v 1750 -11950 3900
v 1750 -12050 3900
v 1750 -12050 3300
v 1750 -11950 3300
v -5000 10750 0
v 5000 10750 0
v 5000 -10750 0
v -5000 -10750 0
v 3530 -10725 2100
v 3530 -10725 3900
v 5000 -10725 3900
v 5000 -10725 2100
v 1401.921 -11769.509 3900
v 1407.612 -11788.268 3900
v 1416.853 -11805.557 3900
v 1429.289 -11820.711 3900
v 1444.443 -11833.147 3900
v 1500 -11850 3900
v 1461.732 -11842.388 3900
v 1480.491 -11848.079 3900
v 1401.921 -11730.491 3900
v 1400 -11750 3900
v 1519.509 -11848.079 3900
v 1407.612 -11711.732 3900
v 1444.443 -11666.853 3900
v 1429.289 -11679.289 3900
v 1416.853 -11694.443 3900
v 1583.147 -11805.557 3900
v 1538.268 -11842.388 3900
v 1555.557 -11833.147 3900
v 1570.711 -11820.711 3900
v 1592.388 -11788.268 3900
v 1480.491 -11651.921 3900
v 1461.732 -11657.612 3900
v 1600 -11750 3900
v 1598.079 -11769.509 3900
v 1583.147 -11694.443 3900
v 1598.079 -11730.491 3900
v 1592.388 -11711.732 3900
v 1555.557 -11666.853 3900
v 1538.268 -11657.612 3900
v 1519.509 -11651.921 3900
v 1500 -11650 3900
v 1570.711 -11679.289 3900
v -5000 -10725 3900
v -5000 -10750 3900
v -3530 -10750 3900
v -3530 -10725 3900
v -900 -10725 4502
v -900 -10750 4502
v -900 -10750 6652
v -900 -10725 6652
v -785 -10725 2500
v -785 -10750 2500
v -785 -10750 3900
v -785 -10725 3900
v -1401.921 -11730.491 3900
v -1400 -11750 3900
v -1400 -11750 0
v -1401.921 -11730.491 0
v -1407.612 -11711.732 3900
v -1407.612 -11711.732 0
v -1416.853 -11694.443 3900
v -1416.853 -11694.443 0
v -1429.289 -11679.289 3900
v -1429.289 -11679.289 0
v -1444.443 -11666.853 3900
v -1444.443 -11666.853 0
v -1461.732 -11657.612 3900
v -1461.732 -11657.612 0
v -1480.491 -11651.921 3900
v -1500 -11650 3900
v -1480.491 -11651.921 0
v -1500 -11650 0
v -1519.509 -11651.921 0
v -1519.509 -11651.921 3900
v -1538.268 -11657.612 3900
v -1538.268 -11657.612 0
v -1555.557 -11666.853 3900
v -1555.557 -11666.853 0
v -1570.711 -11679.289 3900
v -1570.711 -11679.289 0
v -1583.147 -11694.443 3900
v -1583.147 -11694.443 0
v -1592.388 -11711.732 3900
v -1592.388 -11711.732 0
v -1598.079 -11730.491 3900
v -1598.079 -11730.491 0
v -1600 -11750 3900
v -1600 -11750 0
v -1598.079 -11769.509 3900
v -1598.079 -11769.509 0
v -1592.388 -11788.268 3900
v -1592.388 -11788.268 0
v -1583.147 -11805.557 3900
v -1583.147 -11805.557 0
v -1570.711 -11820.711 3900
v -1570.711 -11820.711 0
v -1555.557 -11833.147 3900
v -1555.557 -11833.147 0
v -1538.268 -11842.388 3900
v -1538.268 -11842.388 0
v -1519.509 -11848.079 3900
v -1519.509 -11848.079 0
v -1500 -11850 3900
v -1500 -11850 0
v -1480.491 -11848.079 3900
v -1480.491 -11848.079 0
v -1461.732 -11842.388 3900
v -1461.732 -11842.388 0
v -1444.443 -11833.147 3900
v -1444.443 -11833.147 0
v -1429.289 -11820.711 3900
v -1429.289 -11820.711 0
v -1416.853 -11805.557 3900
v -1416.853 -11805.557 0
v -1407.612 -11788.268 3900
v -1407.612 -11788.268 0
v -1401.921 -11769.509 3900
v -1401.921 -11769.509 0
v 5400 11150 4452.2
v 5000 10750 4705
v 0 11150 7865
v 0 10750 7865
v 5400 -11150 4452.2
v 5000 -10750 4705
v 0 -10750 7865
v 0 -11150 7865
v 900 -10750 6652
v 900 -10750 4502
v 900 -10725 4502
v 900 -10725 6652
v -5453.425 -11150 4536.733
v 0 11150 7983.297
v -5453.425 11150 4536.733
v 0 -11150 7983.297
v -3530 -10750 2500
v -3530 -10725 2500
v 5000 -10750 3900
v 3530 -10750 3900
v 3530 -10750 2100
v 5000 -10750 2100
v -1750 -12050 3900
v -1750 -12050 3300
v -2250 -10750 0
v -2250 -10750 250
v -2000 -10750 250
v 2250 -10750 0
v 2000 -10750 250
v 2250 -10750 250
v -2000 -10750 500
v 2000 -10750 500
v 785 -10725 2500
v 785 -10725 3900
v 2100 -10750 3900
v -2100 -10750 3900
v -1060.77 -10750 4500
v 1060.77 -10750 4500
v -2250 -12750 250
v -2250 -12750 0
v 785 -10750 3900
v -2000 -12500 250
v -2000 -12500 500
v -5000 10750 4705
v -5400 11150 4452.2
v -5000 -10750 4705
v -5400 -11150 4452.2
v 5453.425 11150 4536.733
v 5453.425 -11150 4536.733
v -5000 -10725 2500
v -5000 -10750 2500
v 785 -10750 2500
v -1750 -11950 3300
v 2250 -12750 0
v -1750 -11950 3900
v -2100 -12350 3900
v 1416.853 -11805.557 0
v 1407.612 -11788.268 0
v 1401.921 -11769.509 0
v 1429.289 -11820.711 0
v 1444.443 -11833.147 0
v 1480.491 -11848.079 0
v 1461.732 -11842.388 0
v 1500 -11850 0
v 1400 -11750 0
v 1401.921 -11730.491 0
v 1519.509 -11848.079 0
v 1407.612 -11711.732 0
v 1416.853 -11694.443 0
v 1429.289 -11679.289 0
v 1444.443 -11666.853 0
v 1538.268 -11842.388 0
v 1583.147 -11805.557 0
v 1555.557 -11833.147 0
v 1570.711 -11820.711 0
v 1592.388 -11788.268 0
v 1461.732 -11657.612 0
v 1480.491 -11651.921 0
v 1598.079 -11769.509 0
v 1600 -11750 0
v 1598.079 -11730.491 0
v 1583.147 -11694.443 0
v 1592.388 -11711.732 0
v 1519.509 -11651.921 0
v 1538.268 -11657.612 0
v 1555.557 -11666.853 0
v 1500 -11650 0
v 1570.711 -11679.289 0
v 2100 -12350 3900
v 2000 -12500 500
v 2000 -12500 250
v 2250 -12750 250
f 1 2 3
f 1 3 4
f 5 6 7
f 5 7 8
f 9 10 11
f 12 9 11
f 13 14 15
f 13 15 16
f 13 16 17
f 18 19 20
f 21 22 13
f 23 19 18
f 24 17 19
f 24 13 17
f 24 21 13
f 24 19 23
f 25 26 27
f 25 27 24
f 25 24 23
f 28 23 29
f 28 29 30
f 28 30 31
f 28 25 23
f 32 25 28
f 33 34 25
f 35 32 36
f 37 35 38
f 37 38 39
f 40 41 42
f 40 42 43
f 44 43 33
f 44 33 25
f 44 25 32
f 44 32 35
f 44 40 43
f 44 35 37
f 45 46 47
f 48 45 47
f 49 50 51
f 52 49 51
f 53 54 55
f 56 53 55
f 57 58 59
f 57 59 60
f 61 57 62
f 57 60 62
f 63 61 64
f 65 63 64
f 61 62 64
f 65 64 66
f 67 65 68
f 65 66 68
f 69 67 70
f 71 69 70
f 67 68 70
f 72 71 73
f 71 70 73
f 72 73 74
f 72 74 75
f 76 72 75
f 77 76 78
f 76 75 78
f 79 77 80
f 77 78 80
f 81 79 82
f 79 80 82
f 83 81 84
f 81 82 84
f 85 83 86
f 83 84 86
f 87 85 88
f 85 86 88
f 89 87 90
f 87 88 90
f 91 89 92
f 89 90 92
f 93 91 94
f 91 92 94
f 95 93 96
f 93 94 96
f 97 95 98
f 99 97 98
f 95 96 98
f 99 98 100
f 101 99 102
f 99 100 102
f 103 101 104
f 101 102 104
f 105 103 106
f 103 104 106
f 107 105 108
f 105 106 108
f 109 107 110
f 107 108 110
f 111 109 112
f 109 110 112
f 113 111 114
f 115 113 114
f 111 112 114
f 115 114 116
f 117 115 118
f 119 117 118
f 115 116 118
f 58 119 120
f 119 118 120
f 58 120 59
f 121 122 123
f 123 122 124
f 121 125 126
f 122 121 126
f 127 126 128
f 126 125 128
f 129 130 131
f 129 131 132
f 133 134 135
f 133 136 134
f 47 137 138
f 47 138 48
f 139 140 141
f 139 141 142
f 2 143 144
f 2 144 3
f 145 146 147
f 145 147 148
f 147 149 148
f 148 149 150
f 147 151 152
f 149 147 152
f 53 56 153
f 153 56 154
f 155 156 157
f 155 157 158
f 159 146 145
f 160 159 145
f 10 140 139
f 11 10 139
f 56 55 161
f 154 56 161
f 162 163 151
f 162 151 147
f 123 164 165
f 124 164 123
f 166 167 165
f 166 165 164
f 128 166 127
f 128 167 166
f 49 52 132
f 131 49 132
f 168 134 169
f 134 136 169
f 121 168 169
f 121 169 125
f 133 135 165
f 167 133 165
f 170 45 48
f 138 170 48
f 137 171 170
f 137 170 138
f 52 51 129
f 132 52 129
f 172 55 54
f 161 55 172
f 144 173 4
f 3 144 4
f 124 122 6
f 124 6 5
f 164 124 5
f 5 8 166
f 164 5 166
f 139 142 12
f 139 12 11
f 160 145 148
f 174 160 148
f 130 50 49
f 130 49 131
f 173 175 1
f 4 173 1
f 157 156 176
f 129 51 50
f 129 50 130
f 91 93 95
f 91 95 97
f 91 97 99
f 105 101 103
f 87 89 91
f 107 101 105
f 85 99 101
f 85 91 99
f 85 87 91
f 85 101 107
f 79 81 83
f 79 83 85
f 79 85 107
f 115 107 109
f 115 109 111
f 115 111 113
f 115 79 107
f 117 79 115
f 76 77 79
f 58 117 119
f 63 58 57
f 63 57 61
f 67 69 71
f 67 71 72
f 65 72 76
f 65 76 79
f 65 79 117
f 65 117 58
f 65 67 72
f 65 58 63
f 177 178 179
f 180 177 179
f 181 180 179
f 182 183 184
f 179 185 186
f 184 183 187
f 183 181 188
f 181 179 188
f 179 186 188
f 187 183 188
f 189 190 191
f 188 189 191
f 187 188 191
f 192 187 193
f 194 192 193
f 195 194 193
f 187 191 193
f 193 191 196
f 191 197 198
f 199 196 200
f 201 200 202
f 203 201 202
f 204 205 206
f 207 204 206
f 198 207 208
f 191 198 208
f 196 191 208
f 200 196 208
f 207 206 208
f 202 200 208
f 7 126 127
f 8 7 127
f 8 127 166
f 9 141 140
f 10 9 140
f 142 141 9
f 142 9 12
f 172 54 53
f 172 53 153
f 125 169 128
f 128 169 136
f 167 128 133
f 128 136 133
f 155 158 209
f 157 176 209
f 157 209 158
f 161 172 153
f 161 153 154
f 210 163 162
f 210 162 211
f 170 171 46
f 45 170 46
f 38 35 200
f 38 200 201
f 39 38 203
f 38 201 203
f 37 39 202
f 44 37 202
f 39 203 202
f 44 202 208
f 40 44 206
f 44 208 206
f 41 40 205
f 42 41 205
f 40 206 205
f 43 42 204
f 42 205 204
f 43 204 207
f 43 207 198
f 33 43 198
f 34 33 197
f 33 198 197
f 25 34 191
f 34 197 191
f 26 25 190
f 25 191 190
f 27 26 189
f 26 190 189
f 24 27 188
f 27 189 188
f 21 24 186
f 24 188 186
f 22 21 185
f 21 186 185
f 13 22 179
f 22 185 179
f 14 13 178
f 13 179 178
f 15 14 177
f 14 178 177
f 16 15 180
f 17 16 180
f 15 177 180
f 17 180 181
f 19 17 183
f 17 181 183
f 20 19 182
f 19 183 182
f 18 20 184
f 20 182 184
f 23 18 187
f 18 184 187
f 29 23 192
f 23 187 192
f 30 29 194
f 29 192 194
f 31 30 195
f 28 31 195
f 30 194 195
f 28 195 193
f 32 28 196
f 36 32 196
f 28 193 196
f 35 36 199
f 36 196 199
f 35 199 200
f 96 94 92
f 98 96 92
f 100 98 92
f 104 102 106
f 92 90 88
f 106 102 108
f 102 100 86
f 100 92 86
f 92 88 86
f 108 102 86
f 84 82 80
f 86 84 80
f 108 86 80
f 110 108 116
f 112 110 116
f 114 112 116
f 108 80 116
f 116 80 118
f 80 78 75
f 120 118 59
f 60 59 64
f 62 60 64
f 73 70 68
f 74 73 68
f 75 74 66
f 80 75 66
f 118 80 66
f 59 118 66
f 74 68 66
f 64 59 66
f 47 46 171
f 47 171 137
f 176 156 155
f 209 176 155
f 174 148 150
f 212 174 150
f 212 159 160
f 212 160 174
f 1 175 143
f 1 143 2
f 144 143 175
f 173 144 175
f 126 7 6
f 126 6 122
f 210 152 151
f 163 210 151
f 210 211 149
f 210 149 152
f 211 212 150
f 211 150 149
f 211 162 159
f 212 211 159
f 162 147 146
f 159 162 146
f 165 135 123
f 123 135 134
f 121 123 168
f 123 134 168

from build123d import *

# Parameters (mm, degrees)
F1_DEPTH  = 10750
F3_DEPTH  = 21500
F5_DEPTH  = 400
F7_DEPTH  = 400
F9_W      = 1800
F9_H      = 2150
F10_DEPTH = 25
F9_W_2    = 1570
F9_H_2    = 1400
F9_W_3    = 1470
F9_H_3    = 1800
F11_R     = 100
F12_DEPTH = 3900
F13_W     = 4200
F13_H     = 1600
F13_R     = 100
F14_DEPTH = 600
F16_DEPTH = 7553.4257402618
F19_DEPTH = 23900.001
F21_DEPTH = 2000
F22_W     = 4000
F22_H     = 250
F23_DEPTH = 250
F24_W     = 3500
F24_H     = 100
F25_DEPTH = 600


with BuildPart() as f1:
    # F0 (on Front) → F1 (new body, symmetric)
    with BuildSketch(Plane.XZ):
        Polygon((0, 7865), (0, 0), (5000, 0), (5000, 4705), align=None)
    extrude(amount=F1_DEPTH, both=True)

    # F2 (on face) → F3 (join)
    with BuildSketch(Plane.XZ.offset(10750)):
        Polygon((5400, 4452.2), (5453.4247402618, 4536.7328168699), (0, 7983.2972527154), (0, 7865), align=None)
    extrude(amount=-F3_DEPTH)

    # F4 (on face) → F5 (join)
    with BuildSketch(Plane.XZ.offset(10750)):
        Polygon((5453.4247402618, 4536.7328168699), (0, 7983.2972527154), (0, 7865), (5000, 4705), (5400, 4452.2), align=None)
    extrude(amount=F5_DEPTH)

    # F6 (on face) → F7 (join)
    with BuildSketch(Plane(origin=(0, 10750, 0), x_dir=(-1, 0, 0), z_dir=(0, 1, 0))):
        Polygon((0, 7865), (0, 7983.2972527154), (-5453.4247402618, 4536.7328168699), (-5400, 4452.2), (-5000, 4705), align=None)
    extrude(amount=F7_DEPTH)

    # F8: F1 across face


with BuildPart() as f1_1:
    add(f1.part)
    add(f1.part.mirror(Plane(origin=(0, 0, 3993.815697783), x_dir=(0, -1, 0), z_dir=(-1, 0, 0))))


with BuildPart() as f10:
    # F9 (on face) → F10 (new body)
    with BuildSketch(Plane.XZ.offset(10750)):
        with Locations((0, 5577)):
            Rectangle(F9_W, F9_H)
    extrude(amount=-F10_DEPTH)


with BuildPart() as f10b:
    # F9 (on face) → F10, piece 2 (new body)
    with BuildSketch(Plane.XZ.offset(10750)):
        with Locations((0, 3200)):
            Rectangle(F9_W_2, F9_H_2)
    extrude(amount=-F10_DEPTH)


with BuildPart() as f10c:
    # F9 (on face) → F10, piece 3 (new body)
    with BuildSketch(Plane.XZ.offset(10750)):
        with Locations((-4265, 3200)):
            Rectangle(F9_W_3, F9_H_2)
    extrude(amount=-F10_DEPTH)


with BuildPart() as f10d:
    # F9 (on face) → F10, piece 4 (new body)
    with BuildSketch(Plane.XZ.offset(10750)):
        with Locations((4265, 3000)):
            Rectangle(F9_W_3, F9_H_3)
    extrude(amount=-F10_DEPTH)


with BuildPart() as f12:
    # F11 (on Top) → F12 (new body)
    with BuildSketch(Plane.XY):
        with Locations((-1500, -11750)):
            Circle(F11_R)
    extrude(amount=F12_DEPTH)


with BuildPart() as f12b:
    # F11 (on Top) → F12, piece 2 (new body)
    with BuildSketch(Plane.XY):
        with Locations((1500, -11750)):
            Circle(F11_R)
    extrude(amount=F12_DEPTH)


with BuildPart() as f14:
    # F13 (on face) → F14 (new body)
    with BuildSketch(Plane.XY.offset(3900)):
        with Locations((0, -11550)):
            Rectangle(F13_W, F13_H)
        with Locations((-1500, -11750)):
            Circle(F13_R, mode=Mode.SUBTRACT)
        with Locations((1500, -11750)):
            Circle(F13_R, mode=Mode.SUBTRACT)
        with Locations((1500, -11750)):
            Circle(F13_R)
        with Locations((-1500, -11750)):
            Circle(F13_R)
    extrude(amount=F14_DEPTH)

    # F15 (on face) → F16 (cut, through all)
    with BuildSketch(Plane.YZ.offset(2100)):
        Polygon((-12350, 4500), (-12350, 3900), (-10750, 4500), align=None)
    extrude(amount=-F16_DEPTH, mode=Mode.SUBTRACT)

    # F18 (on offset) → F19 (cut, through all)
    with BuildSketch(Plane.XZ.offset(12750)):
        Polygon((-2100, 3900), (-1060.7695154587, 4500), (-2100, 4500), align=None)
        Polygon((2100, 3900), (2100, 4500), (1060.7695154587, 4500), align=None)
    extrude(amount=-F19_DEPTH, mode=Mode.SUBTRACT)


with BuildPart() as f21:
    # F20 (on face) → F21 (new body)
    with BuildSketch(Plane.XZ.offset(10750)):
        Polygon((-2250, 250), (-2250, 0), (2250, 0), (2250, 250), (2000, 250), (2000, 500), (-2000, 500), (-2000, 250), align=None)
    extrude(amount=F21_DEPTH)

    # F22 (on face) → F23 (cut)
    with BuildSketch(Plane.XZ.offset(12750)):
        with Locations((0, 375)):
            Rectangle(F22_W, F22_H)
    extrude(amount=-F23_DEPTH, mode=Mode.SUBTRACT)


with BuildPart() as f25:
    # F24 (on face) → F25 (new body)
    with BuildSketch(Plane.XY.offset(3900)):
        with Locations((0, -12000)):
            Rectangle(F24_W, F24_H)
    extrude(amount=-F25_DEPTH)


solid = Compound([f1_1.part, f10.part, f10b.part, f10c.part, f10d.part, f12.part, f12b.part, f14.part, f21.part, f25.part])
